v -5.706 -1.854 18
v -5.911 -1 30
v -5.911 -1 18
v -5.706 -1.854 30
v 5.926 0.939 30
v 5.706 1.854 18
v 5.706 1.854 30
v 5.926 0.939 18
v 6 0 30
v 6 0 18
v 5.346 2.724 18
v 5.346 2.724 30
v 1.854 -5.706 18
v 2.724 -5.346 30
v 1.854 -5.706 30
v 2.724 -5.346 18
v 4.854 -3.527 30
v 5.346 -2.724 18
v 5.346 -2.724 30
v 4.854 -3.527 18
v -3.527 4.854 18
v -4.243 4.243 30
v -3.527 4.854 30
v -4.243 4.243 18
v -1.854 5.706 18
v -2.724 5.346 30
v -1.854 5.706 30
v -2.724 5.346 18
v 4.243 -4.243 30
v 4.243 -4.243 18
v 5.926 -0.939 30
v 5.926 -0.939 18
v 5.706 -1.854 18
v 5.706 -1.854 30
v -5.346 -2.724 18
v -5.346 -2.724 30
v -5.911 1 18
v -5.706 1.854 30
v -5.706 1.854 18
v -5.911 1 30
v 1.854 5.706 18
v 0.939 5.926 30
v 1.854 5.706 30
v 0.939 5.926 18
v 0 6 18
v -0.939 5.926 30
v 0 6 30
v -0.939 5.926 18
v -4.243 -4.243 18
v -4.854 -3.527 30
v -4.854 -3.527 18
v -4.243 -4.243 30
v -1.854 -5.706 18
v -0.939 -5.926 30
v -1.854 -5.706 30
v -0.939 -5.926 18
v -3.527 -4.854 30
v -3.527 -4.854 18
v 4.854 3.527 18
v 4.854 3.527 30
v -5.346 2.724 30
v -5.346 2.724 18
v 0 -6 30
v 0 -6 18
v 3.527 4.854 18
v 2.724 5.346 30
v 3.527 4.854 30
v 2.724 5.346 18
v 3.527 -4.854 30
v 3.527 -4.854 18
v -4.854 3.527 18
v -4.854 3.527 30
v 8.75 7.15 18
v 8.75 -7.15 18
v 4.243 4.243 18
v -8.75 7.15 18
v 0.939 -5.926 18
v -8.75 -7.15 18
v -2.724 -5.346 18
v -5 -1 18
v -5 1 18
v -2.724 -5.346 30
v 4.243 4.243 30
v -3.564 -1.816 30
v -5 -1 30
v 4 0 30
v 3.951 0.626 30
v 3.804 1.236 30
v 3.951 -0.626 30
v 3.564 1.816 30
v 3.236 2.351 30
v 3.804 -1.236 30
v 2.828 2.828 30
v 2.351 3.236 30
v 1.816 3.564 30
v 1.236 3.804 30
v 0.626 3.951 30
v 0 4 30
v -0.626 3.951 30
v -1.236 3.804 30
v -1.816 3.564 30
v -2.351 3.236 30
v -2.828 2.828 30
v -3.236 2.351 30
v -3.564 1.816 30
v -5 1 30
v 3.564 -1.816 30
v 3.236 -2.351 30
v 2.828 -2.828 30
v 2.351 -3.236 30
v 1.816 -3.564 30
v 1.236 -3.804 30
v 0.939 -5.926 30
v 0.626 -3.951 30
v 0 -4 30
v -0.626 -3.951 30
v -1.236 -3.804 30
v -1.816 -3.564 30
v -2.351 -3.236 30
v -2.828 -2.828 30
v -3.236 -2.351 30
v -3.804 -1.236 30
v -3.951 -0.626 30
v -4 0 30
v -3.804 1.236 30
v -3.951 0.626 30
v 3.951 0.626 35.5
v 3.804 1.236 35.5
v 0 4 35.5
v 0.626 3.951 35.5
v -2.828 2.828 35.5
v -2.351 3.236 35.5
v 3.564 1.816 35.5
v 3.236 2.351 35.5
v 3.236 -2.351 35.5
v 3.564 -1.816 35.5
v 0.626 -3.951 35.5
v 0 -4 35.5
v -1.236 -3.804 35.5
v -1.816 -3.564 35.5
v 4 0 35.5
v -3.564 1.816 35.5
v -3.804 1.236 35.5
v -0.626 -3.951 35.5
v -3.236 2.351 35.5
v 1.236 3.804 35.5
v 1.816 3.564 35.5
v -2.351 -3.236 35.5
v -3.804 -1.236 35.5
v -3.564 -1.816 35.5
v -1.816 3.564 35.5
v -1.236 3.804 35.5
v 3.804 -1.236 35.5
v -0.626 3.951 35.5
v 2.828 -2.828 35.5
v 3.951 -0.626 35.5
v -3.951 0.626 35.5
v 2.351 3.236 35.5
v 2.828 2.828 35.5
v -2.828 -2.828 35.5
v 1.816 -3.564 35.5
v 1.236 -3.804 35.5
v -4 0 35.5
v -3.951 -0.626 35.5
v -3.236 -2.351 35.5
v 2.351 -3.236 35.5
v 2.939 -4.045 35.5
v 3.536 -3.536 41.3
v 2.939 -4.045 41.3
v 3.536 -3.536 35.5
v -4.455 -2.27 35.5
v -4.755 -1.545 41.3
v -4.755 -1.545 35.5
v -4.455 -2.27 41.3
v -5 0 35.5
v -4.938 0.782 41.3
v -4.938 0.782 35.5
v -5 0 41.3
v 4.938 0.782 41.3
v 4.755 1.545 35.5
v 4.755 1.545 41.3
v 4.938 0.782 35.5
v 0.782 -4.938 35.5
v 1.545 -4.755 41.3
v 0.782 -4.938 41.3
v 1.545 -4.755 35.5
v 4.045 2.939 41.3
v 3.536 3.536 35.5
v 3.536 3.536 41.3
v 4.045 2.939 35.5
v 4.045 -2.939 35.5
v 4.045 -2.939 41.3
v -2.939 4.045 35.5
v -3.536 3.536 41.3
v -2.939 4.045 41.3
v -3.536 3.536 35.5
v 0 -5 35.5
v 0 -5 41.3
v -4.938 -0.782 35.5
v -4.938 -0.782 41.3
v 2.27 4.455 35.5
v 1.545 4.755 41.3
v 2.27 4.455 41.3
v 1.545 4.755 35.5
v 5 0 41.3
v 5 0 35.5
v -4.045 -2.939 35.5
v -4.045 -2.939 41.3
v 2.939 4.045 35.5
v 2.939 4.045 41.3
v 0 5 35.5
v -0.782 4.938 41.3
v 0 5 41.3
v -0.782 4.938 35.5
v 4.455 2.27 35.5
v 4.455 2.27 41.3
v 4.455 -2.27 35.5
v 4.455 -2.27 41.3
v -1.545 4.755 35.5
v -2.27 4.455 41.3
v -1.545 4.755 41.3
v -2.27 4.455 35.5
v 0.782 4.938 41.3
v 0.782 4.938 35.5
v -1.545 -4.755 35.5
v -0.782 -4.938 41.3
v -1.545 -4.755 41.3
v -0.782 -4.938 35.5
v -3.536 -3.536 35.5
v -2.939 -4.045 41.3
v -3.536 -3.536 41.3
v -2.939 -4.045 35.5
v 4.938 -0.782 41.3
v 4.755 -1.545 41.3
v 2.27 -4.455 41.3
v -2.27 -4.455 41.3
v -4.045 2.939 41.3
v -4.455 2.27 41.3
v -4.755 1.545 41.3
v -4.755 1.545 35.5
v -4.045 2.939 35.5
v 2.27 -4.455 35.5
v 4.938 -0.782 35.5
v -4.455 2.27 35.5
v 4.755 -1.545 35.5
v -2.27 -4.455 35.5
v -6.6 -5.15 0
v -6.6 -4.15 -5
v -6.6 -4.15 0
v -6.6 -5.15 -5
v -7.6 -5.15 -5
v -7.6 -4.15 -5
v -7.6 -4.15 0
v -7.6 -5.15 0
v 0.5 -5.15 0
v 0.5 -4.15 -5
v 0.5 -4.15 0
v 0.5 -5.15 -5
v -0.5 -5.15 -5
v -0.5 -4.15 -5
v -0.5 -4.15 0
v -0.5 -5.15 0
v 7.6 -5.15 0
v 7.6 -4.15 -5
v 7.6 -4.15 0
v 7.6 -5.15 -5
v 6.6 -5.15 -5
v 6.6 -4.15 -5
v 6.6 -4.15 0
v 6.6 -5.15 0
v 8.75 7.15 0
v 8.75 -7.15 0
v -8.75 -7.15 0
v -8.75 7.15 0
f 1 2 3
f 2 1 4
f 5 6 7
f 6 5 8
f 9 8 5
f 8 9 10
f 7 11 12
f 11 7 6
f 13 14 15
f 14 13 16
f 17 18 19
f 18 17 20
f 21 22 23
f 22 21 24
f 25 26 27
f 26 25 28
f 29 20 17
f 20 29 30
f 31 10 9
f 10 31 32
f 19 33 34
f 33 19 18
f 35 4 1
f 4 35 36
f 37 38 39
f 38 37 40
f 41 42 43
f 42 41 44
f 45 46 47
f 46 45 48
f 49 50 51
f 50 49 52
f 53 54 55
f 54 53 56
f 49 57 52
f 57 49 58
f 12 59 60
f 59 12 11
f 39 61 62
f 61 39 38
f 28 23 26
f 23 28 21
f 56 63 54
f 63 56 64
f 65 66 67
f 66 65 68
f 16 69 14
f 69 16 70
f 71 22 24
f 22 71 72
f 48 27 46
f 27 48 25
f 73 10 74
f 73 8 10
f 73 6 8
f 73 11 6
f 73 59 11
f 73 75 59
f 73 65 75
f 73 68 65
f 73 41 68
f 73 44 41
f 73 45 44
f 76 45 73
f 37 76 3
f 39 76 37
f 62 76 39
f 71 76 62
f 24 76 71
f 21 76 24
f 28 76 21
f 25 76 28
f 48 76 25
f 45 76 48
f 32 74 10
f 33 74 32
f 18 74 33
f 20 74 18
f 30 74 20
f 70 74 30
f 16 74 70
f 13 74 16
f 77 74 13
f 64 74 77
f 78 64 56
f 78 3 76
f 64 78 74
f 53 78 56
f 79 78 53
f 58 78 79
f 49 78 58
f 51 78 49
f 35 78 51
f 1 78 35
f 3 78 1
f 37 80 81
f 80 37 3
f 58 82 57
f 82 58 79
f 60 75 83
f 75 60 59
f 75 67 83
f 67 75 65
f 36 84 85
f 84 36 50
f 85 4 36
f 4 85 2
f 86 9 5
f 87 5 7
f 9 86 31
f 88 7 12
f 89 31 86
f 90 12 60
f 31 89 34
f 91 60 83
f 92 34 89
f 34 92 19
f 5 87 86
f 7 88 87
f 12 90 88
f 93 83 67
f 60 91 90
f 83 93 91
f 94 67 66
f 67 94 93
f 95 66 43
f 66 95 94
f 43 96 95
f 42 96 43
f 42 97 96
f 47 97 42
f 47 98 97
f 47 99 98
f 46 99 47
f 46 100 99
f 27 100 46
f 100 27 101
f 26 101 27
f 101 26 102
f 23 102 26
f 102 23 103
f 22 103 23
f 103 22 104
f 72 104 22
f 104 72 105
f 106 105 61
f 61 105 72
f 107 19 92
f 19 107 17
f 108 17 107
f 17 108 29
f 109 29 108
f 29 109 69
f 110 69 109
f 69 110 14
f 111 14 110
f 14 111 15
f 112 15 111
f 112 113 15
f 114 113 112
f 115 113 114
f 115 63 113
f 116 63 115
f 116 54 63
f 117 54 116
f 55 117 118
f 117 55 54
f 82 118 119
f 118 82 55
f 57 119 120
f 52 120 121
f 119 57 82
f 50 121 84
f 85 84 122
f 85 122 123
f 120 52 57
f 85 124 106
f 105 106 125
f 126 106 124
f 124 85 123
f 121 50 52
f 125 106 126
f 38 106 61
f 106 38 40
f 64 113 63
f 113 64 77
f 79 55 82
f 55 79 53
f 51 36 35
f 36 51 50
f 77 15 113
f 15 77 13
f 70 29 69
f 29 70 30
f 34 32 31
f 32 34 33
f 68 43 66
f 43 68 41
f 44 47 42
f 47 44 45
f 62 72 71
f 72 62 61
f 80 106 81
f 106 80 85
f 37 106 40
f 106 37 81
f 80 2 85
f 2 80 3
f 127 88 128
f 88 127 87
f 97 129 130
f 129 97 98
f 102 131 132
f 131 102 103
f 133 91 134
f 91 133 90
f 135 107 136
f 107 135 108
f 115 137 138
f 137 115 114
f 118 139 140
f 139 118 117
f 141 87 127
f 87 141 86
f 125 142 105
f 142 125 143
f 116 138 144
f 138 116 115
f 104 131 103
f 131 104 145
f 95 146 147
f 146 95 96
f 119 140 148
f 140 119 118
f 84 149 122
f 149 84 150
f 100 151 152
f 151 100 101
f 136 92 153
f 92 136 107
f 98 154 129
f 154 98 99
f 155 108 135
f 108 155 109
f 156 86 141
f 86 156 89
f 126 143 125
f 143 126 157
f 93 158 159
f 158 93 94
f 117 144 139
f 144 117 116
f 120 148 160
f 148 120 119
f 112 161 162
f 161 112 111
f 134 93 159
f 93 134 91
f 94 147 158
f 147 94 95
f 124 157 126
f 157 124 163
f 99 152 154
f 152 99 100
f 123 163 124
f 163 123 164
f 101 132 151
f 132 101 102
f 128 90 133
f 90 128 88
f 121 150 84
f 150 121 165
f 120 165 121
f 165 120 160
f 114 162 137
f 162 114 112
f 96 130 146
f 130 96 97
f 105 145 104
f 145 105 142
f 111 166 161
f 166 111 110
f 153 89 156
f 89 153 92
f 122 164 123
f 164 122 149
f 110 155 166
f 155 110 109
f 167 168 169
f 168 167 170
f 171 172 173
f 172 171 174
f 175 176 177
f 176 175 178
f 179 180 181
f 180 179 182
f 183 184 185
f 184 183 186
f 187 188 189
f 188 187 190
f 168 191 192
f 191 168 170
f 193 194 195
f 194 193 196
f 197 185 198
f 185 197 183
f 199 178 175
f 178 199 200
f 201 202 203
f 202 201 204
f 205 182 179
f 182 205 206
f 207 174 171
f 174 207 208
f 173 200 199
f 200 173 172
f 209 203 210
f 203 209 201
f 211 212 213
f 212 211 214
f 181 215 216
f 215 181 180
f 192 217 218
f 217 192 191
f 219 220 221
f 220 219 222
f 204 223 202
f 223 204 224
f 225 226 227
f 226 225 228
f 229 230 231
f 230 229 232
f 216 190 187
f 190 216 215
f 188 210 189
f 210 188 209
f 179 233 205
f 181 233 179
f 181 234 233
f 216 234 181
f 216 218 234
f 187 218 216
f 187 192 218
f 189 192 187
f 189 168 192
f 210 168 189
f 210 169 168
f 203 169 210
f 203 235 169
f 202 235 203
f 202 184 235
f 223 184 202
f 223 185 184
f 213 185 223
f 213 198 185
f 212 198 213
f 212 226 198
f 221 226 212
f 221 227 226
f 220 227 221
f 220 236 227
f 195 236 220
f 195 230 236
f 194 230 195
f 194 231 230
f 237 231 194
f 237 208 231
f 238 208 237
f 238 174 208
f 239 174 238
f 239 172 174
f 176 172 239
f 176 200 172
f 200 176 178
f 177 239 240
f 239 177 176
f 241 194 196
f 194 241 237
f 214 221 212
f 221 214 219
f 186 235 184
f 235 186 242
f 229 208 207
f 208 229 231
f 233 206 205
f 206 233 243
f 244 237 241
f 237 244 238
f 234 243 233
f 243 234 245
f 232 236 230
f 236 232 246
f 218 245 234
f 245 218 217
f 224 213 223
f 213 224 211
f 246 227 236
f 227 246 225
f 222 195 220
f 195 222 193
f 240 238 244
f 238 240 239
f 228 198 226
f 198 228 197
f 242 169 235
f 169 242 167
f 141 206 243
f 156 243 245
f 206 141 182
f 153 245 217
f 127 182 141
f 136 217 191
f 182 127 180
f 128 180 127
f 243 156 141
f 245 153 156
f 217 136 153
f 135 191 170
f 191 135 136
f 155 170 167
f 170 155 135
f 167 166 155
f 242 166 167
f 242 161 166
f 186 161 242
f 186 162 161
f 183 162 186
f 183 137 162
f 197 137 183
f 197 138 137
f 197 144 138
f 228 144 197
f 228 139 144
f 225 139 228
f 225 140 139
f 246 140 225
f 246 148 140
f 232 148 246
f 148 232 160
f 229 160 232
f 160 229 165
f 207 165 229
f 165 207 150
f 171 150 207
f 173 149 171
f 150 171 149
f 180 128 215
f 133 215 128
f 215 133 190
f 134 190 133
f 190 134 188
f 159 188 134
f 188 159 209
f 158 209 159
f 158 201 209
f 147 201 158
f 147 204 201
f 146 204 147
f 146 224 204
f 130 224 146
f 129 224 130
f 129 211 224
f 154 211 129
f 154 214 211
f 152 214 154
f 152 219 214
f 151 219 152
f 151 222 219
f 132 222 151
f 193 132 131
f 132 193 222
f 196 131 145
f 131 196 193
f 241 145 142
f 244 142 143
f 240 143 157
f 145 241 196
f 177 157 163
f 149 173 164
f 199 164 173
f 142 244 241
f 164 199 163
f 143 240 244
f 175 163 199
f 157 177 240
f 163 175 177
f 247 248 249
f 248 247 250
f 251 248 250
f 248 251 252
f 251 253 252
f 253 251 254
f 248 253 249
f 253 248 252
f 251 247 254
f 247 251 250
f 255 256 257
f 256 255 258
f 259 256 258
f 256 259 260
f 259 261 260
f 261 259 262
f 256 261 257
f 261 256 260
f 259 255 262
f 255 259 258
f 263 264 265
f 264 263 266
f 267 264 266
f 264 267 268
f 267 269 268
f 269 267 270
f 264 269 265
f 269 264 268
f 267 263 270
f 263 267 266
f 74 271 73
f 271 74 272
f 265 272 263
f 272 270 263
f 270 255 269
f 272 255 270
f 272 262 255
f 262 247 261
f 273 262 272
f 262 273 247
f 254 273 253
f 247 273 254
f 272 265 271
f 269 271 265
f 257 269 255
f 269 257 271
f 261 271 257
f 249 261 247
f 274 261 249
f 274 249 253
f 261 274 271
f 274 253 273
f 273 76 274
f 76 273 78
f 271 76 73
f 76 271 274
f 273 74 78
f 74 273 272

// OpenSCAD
$fn=40;

red = [0.8,0.2,0.2];
black = [0.2,0.2,0.2];
silver = [0.75,0.75,0.75];
epsilon = 0.001;

// The model is centered
pins = [ [ -7.1, -4.65], [0, -4.65], [7.1, -4.65] ];

module base()
{
    color(red) translate([0,0,9])
	cube([17.5, 14.3, 18], center=true);
}

module body()
{
    difference() {
	translate([0,0,18])
	    cylinder(12, d=12);
	translate([-6,-1,18])
	    cube([1,2,12+epsilon]);
    }
}

module switch()
{
    translate([0,0,30])
	cylinder(6, d=8);
    translate([0,0,35.5])
	cylinder(5.8, d=10);
}

color(red) base();
color(silver) union() { body(); switch(); }

// Pins
color(silver) for (pos = pins)
	translate(pos) translate([0,0,-2]) cube([1,1,6], center=true);
